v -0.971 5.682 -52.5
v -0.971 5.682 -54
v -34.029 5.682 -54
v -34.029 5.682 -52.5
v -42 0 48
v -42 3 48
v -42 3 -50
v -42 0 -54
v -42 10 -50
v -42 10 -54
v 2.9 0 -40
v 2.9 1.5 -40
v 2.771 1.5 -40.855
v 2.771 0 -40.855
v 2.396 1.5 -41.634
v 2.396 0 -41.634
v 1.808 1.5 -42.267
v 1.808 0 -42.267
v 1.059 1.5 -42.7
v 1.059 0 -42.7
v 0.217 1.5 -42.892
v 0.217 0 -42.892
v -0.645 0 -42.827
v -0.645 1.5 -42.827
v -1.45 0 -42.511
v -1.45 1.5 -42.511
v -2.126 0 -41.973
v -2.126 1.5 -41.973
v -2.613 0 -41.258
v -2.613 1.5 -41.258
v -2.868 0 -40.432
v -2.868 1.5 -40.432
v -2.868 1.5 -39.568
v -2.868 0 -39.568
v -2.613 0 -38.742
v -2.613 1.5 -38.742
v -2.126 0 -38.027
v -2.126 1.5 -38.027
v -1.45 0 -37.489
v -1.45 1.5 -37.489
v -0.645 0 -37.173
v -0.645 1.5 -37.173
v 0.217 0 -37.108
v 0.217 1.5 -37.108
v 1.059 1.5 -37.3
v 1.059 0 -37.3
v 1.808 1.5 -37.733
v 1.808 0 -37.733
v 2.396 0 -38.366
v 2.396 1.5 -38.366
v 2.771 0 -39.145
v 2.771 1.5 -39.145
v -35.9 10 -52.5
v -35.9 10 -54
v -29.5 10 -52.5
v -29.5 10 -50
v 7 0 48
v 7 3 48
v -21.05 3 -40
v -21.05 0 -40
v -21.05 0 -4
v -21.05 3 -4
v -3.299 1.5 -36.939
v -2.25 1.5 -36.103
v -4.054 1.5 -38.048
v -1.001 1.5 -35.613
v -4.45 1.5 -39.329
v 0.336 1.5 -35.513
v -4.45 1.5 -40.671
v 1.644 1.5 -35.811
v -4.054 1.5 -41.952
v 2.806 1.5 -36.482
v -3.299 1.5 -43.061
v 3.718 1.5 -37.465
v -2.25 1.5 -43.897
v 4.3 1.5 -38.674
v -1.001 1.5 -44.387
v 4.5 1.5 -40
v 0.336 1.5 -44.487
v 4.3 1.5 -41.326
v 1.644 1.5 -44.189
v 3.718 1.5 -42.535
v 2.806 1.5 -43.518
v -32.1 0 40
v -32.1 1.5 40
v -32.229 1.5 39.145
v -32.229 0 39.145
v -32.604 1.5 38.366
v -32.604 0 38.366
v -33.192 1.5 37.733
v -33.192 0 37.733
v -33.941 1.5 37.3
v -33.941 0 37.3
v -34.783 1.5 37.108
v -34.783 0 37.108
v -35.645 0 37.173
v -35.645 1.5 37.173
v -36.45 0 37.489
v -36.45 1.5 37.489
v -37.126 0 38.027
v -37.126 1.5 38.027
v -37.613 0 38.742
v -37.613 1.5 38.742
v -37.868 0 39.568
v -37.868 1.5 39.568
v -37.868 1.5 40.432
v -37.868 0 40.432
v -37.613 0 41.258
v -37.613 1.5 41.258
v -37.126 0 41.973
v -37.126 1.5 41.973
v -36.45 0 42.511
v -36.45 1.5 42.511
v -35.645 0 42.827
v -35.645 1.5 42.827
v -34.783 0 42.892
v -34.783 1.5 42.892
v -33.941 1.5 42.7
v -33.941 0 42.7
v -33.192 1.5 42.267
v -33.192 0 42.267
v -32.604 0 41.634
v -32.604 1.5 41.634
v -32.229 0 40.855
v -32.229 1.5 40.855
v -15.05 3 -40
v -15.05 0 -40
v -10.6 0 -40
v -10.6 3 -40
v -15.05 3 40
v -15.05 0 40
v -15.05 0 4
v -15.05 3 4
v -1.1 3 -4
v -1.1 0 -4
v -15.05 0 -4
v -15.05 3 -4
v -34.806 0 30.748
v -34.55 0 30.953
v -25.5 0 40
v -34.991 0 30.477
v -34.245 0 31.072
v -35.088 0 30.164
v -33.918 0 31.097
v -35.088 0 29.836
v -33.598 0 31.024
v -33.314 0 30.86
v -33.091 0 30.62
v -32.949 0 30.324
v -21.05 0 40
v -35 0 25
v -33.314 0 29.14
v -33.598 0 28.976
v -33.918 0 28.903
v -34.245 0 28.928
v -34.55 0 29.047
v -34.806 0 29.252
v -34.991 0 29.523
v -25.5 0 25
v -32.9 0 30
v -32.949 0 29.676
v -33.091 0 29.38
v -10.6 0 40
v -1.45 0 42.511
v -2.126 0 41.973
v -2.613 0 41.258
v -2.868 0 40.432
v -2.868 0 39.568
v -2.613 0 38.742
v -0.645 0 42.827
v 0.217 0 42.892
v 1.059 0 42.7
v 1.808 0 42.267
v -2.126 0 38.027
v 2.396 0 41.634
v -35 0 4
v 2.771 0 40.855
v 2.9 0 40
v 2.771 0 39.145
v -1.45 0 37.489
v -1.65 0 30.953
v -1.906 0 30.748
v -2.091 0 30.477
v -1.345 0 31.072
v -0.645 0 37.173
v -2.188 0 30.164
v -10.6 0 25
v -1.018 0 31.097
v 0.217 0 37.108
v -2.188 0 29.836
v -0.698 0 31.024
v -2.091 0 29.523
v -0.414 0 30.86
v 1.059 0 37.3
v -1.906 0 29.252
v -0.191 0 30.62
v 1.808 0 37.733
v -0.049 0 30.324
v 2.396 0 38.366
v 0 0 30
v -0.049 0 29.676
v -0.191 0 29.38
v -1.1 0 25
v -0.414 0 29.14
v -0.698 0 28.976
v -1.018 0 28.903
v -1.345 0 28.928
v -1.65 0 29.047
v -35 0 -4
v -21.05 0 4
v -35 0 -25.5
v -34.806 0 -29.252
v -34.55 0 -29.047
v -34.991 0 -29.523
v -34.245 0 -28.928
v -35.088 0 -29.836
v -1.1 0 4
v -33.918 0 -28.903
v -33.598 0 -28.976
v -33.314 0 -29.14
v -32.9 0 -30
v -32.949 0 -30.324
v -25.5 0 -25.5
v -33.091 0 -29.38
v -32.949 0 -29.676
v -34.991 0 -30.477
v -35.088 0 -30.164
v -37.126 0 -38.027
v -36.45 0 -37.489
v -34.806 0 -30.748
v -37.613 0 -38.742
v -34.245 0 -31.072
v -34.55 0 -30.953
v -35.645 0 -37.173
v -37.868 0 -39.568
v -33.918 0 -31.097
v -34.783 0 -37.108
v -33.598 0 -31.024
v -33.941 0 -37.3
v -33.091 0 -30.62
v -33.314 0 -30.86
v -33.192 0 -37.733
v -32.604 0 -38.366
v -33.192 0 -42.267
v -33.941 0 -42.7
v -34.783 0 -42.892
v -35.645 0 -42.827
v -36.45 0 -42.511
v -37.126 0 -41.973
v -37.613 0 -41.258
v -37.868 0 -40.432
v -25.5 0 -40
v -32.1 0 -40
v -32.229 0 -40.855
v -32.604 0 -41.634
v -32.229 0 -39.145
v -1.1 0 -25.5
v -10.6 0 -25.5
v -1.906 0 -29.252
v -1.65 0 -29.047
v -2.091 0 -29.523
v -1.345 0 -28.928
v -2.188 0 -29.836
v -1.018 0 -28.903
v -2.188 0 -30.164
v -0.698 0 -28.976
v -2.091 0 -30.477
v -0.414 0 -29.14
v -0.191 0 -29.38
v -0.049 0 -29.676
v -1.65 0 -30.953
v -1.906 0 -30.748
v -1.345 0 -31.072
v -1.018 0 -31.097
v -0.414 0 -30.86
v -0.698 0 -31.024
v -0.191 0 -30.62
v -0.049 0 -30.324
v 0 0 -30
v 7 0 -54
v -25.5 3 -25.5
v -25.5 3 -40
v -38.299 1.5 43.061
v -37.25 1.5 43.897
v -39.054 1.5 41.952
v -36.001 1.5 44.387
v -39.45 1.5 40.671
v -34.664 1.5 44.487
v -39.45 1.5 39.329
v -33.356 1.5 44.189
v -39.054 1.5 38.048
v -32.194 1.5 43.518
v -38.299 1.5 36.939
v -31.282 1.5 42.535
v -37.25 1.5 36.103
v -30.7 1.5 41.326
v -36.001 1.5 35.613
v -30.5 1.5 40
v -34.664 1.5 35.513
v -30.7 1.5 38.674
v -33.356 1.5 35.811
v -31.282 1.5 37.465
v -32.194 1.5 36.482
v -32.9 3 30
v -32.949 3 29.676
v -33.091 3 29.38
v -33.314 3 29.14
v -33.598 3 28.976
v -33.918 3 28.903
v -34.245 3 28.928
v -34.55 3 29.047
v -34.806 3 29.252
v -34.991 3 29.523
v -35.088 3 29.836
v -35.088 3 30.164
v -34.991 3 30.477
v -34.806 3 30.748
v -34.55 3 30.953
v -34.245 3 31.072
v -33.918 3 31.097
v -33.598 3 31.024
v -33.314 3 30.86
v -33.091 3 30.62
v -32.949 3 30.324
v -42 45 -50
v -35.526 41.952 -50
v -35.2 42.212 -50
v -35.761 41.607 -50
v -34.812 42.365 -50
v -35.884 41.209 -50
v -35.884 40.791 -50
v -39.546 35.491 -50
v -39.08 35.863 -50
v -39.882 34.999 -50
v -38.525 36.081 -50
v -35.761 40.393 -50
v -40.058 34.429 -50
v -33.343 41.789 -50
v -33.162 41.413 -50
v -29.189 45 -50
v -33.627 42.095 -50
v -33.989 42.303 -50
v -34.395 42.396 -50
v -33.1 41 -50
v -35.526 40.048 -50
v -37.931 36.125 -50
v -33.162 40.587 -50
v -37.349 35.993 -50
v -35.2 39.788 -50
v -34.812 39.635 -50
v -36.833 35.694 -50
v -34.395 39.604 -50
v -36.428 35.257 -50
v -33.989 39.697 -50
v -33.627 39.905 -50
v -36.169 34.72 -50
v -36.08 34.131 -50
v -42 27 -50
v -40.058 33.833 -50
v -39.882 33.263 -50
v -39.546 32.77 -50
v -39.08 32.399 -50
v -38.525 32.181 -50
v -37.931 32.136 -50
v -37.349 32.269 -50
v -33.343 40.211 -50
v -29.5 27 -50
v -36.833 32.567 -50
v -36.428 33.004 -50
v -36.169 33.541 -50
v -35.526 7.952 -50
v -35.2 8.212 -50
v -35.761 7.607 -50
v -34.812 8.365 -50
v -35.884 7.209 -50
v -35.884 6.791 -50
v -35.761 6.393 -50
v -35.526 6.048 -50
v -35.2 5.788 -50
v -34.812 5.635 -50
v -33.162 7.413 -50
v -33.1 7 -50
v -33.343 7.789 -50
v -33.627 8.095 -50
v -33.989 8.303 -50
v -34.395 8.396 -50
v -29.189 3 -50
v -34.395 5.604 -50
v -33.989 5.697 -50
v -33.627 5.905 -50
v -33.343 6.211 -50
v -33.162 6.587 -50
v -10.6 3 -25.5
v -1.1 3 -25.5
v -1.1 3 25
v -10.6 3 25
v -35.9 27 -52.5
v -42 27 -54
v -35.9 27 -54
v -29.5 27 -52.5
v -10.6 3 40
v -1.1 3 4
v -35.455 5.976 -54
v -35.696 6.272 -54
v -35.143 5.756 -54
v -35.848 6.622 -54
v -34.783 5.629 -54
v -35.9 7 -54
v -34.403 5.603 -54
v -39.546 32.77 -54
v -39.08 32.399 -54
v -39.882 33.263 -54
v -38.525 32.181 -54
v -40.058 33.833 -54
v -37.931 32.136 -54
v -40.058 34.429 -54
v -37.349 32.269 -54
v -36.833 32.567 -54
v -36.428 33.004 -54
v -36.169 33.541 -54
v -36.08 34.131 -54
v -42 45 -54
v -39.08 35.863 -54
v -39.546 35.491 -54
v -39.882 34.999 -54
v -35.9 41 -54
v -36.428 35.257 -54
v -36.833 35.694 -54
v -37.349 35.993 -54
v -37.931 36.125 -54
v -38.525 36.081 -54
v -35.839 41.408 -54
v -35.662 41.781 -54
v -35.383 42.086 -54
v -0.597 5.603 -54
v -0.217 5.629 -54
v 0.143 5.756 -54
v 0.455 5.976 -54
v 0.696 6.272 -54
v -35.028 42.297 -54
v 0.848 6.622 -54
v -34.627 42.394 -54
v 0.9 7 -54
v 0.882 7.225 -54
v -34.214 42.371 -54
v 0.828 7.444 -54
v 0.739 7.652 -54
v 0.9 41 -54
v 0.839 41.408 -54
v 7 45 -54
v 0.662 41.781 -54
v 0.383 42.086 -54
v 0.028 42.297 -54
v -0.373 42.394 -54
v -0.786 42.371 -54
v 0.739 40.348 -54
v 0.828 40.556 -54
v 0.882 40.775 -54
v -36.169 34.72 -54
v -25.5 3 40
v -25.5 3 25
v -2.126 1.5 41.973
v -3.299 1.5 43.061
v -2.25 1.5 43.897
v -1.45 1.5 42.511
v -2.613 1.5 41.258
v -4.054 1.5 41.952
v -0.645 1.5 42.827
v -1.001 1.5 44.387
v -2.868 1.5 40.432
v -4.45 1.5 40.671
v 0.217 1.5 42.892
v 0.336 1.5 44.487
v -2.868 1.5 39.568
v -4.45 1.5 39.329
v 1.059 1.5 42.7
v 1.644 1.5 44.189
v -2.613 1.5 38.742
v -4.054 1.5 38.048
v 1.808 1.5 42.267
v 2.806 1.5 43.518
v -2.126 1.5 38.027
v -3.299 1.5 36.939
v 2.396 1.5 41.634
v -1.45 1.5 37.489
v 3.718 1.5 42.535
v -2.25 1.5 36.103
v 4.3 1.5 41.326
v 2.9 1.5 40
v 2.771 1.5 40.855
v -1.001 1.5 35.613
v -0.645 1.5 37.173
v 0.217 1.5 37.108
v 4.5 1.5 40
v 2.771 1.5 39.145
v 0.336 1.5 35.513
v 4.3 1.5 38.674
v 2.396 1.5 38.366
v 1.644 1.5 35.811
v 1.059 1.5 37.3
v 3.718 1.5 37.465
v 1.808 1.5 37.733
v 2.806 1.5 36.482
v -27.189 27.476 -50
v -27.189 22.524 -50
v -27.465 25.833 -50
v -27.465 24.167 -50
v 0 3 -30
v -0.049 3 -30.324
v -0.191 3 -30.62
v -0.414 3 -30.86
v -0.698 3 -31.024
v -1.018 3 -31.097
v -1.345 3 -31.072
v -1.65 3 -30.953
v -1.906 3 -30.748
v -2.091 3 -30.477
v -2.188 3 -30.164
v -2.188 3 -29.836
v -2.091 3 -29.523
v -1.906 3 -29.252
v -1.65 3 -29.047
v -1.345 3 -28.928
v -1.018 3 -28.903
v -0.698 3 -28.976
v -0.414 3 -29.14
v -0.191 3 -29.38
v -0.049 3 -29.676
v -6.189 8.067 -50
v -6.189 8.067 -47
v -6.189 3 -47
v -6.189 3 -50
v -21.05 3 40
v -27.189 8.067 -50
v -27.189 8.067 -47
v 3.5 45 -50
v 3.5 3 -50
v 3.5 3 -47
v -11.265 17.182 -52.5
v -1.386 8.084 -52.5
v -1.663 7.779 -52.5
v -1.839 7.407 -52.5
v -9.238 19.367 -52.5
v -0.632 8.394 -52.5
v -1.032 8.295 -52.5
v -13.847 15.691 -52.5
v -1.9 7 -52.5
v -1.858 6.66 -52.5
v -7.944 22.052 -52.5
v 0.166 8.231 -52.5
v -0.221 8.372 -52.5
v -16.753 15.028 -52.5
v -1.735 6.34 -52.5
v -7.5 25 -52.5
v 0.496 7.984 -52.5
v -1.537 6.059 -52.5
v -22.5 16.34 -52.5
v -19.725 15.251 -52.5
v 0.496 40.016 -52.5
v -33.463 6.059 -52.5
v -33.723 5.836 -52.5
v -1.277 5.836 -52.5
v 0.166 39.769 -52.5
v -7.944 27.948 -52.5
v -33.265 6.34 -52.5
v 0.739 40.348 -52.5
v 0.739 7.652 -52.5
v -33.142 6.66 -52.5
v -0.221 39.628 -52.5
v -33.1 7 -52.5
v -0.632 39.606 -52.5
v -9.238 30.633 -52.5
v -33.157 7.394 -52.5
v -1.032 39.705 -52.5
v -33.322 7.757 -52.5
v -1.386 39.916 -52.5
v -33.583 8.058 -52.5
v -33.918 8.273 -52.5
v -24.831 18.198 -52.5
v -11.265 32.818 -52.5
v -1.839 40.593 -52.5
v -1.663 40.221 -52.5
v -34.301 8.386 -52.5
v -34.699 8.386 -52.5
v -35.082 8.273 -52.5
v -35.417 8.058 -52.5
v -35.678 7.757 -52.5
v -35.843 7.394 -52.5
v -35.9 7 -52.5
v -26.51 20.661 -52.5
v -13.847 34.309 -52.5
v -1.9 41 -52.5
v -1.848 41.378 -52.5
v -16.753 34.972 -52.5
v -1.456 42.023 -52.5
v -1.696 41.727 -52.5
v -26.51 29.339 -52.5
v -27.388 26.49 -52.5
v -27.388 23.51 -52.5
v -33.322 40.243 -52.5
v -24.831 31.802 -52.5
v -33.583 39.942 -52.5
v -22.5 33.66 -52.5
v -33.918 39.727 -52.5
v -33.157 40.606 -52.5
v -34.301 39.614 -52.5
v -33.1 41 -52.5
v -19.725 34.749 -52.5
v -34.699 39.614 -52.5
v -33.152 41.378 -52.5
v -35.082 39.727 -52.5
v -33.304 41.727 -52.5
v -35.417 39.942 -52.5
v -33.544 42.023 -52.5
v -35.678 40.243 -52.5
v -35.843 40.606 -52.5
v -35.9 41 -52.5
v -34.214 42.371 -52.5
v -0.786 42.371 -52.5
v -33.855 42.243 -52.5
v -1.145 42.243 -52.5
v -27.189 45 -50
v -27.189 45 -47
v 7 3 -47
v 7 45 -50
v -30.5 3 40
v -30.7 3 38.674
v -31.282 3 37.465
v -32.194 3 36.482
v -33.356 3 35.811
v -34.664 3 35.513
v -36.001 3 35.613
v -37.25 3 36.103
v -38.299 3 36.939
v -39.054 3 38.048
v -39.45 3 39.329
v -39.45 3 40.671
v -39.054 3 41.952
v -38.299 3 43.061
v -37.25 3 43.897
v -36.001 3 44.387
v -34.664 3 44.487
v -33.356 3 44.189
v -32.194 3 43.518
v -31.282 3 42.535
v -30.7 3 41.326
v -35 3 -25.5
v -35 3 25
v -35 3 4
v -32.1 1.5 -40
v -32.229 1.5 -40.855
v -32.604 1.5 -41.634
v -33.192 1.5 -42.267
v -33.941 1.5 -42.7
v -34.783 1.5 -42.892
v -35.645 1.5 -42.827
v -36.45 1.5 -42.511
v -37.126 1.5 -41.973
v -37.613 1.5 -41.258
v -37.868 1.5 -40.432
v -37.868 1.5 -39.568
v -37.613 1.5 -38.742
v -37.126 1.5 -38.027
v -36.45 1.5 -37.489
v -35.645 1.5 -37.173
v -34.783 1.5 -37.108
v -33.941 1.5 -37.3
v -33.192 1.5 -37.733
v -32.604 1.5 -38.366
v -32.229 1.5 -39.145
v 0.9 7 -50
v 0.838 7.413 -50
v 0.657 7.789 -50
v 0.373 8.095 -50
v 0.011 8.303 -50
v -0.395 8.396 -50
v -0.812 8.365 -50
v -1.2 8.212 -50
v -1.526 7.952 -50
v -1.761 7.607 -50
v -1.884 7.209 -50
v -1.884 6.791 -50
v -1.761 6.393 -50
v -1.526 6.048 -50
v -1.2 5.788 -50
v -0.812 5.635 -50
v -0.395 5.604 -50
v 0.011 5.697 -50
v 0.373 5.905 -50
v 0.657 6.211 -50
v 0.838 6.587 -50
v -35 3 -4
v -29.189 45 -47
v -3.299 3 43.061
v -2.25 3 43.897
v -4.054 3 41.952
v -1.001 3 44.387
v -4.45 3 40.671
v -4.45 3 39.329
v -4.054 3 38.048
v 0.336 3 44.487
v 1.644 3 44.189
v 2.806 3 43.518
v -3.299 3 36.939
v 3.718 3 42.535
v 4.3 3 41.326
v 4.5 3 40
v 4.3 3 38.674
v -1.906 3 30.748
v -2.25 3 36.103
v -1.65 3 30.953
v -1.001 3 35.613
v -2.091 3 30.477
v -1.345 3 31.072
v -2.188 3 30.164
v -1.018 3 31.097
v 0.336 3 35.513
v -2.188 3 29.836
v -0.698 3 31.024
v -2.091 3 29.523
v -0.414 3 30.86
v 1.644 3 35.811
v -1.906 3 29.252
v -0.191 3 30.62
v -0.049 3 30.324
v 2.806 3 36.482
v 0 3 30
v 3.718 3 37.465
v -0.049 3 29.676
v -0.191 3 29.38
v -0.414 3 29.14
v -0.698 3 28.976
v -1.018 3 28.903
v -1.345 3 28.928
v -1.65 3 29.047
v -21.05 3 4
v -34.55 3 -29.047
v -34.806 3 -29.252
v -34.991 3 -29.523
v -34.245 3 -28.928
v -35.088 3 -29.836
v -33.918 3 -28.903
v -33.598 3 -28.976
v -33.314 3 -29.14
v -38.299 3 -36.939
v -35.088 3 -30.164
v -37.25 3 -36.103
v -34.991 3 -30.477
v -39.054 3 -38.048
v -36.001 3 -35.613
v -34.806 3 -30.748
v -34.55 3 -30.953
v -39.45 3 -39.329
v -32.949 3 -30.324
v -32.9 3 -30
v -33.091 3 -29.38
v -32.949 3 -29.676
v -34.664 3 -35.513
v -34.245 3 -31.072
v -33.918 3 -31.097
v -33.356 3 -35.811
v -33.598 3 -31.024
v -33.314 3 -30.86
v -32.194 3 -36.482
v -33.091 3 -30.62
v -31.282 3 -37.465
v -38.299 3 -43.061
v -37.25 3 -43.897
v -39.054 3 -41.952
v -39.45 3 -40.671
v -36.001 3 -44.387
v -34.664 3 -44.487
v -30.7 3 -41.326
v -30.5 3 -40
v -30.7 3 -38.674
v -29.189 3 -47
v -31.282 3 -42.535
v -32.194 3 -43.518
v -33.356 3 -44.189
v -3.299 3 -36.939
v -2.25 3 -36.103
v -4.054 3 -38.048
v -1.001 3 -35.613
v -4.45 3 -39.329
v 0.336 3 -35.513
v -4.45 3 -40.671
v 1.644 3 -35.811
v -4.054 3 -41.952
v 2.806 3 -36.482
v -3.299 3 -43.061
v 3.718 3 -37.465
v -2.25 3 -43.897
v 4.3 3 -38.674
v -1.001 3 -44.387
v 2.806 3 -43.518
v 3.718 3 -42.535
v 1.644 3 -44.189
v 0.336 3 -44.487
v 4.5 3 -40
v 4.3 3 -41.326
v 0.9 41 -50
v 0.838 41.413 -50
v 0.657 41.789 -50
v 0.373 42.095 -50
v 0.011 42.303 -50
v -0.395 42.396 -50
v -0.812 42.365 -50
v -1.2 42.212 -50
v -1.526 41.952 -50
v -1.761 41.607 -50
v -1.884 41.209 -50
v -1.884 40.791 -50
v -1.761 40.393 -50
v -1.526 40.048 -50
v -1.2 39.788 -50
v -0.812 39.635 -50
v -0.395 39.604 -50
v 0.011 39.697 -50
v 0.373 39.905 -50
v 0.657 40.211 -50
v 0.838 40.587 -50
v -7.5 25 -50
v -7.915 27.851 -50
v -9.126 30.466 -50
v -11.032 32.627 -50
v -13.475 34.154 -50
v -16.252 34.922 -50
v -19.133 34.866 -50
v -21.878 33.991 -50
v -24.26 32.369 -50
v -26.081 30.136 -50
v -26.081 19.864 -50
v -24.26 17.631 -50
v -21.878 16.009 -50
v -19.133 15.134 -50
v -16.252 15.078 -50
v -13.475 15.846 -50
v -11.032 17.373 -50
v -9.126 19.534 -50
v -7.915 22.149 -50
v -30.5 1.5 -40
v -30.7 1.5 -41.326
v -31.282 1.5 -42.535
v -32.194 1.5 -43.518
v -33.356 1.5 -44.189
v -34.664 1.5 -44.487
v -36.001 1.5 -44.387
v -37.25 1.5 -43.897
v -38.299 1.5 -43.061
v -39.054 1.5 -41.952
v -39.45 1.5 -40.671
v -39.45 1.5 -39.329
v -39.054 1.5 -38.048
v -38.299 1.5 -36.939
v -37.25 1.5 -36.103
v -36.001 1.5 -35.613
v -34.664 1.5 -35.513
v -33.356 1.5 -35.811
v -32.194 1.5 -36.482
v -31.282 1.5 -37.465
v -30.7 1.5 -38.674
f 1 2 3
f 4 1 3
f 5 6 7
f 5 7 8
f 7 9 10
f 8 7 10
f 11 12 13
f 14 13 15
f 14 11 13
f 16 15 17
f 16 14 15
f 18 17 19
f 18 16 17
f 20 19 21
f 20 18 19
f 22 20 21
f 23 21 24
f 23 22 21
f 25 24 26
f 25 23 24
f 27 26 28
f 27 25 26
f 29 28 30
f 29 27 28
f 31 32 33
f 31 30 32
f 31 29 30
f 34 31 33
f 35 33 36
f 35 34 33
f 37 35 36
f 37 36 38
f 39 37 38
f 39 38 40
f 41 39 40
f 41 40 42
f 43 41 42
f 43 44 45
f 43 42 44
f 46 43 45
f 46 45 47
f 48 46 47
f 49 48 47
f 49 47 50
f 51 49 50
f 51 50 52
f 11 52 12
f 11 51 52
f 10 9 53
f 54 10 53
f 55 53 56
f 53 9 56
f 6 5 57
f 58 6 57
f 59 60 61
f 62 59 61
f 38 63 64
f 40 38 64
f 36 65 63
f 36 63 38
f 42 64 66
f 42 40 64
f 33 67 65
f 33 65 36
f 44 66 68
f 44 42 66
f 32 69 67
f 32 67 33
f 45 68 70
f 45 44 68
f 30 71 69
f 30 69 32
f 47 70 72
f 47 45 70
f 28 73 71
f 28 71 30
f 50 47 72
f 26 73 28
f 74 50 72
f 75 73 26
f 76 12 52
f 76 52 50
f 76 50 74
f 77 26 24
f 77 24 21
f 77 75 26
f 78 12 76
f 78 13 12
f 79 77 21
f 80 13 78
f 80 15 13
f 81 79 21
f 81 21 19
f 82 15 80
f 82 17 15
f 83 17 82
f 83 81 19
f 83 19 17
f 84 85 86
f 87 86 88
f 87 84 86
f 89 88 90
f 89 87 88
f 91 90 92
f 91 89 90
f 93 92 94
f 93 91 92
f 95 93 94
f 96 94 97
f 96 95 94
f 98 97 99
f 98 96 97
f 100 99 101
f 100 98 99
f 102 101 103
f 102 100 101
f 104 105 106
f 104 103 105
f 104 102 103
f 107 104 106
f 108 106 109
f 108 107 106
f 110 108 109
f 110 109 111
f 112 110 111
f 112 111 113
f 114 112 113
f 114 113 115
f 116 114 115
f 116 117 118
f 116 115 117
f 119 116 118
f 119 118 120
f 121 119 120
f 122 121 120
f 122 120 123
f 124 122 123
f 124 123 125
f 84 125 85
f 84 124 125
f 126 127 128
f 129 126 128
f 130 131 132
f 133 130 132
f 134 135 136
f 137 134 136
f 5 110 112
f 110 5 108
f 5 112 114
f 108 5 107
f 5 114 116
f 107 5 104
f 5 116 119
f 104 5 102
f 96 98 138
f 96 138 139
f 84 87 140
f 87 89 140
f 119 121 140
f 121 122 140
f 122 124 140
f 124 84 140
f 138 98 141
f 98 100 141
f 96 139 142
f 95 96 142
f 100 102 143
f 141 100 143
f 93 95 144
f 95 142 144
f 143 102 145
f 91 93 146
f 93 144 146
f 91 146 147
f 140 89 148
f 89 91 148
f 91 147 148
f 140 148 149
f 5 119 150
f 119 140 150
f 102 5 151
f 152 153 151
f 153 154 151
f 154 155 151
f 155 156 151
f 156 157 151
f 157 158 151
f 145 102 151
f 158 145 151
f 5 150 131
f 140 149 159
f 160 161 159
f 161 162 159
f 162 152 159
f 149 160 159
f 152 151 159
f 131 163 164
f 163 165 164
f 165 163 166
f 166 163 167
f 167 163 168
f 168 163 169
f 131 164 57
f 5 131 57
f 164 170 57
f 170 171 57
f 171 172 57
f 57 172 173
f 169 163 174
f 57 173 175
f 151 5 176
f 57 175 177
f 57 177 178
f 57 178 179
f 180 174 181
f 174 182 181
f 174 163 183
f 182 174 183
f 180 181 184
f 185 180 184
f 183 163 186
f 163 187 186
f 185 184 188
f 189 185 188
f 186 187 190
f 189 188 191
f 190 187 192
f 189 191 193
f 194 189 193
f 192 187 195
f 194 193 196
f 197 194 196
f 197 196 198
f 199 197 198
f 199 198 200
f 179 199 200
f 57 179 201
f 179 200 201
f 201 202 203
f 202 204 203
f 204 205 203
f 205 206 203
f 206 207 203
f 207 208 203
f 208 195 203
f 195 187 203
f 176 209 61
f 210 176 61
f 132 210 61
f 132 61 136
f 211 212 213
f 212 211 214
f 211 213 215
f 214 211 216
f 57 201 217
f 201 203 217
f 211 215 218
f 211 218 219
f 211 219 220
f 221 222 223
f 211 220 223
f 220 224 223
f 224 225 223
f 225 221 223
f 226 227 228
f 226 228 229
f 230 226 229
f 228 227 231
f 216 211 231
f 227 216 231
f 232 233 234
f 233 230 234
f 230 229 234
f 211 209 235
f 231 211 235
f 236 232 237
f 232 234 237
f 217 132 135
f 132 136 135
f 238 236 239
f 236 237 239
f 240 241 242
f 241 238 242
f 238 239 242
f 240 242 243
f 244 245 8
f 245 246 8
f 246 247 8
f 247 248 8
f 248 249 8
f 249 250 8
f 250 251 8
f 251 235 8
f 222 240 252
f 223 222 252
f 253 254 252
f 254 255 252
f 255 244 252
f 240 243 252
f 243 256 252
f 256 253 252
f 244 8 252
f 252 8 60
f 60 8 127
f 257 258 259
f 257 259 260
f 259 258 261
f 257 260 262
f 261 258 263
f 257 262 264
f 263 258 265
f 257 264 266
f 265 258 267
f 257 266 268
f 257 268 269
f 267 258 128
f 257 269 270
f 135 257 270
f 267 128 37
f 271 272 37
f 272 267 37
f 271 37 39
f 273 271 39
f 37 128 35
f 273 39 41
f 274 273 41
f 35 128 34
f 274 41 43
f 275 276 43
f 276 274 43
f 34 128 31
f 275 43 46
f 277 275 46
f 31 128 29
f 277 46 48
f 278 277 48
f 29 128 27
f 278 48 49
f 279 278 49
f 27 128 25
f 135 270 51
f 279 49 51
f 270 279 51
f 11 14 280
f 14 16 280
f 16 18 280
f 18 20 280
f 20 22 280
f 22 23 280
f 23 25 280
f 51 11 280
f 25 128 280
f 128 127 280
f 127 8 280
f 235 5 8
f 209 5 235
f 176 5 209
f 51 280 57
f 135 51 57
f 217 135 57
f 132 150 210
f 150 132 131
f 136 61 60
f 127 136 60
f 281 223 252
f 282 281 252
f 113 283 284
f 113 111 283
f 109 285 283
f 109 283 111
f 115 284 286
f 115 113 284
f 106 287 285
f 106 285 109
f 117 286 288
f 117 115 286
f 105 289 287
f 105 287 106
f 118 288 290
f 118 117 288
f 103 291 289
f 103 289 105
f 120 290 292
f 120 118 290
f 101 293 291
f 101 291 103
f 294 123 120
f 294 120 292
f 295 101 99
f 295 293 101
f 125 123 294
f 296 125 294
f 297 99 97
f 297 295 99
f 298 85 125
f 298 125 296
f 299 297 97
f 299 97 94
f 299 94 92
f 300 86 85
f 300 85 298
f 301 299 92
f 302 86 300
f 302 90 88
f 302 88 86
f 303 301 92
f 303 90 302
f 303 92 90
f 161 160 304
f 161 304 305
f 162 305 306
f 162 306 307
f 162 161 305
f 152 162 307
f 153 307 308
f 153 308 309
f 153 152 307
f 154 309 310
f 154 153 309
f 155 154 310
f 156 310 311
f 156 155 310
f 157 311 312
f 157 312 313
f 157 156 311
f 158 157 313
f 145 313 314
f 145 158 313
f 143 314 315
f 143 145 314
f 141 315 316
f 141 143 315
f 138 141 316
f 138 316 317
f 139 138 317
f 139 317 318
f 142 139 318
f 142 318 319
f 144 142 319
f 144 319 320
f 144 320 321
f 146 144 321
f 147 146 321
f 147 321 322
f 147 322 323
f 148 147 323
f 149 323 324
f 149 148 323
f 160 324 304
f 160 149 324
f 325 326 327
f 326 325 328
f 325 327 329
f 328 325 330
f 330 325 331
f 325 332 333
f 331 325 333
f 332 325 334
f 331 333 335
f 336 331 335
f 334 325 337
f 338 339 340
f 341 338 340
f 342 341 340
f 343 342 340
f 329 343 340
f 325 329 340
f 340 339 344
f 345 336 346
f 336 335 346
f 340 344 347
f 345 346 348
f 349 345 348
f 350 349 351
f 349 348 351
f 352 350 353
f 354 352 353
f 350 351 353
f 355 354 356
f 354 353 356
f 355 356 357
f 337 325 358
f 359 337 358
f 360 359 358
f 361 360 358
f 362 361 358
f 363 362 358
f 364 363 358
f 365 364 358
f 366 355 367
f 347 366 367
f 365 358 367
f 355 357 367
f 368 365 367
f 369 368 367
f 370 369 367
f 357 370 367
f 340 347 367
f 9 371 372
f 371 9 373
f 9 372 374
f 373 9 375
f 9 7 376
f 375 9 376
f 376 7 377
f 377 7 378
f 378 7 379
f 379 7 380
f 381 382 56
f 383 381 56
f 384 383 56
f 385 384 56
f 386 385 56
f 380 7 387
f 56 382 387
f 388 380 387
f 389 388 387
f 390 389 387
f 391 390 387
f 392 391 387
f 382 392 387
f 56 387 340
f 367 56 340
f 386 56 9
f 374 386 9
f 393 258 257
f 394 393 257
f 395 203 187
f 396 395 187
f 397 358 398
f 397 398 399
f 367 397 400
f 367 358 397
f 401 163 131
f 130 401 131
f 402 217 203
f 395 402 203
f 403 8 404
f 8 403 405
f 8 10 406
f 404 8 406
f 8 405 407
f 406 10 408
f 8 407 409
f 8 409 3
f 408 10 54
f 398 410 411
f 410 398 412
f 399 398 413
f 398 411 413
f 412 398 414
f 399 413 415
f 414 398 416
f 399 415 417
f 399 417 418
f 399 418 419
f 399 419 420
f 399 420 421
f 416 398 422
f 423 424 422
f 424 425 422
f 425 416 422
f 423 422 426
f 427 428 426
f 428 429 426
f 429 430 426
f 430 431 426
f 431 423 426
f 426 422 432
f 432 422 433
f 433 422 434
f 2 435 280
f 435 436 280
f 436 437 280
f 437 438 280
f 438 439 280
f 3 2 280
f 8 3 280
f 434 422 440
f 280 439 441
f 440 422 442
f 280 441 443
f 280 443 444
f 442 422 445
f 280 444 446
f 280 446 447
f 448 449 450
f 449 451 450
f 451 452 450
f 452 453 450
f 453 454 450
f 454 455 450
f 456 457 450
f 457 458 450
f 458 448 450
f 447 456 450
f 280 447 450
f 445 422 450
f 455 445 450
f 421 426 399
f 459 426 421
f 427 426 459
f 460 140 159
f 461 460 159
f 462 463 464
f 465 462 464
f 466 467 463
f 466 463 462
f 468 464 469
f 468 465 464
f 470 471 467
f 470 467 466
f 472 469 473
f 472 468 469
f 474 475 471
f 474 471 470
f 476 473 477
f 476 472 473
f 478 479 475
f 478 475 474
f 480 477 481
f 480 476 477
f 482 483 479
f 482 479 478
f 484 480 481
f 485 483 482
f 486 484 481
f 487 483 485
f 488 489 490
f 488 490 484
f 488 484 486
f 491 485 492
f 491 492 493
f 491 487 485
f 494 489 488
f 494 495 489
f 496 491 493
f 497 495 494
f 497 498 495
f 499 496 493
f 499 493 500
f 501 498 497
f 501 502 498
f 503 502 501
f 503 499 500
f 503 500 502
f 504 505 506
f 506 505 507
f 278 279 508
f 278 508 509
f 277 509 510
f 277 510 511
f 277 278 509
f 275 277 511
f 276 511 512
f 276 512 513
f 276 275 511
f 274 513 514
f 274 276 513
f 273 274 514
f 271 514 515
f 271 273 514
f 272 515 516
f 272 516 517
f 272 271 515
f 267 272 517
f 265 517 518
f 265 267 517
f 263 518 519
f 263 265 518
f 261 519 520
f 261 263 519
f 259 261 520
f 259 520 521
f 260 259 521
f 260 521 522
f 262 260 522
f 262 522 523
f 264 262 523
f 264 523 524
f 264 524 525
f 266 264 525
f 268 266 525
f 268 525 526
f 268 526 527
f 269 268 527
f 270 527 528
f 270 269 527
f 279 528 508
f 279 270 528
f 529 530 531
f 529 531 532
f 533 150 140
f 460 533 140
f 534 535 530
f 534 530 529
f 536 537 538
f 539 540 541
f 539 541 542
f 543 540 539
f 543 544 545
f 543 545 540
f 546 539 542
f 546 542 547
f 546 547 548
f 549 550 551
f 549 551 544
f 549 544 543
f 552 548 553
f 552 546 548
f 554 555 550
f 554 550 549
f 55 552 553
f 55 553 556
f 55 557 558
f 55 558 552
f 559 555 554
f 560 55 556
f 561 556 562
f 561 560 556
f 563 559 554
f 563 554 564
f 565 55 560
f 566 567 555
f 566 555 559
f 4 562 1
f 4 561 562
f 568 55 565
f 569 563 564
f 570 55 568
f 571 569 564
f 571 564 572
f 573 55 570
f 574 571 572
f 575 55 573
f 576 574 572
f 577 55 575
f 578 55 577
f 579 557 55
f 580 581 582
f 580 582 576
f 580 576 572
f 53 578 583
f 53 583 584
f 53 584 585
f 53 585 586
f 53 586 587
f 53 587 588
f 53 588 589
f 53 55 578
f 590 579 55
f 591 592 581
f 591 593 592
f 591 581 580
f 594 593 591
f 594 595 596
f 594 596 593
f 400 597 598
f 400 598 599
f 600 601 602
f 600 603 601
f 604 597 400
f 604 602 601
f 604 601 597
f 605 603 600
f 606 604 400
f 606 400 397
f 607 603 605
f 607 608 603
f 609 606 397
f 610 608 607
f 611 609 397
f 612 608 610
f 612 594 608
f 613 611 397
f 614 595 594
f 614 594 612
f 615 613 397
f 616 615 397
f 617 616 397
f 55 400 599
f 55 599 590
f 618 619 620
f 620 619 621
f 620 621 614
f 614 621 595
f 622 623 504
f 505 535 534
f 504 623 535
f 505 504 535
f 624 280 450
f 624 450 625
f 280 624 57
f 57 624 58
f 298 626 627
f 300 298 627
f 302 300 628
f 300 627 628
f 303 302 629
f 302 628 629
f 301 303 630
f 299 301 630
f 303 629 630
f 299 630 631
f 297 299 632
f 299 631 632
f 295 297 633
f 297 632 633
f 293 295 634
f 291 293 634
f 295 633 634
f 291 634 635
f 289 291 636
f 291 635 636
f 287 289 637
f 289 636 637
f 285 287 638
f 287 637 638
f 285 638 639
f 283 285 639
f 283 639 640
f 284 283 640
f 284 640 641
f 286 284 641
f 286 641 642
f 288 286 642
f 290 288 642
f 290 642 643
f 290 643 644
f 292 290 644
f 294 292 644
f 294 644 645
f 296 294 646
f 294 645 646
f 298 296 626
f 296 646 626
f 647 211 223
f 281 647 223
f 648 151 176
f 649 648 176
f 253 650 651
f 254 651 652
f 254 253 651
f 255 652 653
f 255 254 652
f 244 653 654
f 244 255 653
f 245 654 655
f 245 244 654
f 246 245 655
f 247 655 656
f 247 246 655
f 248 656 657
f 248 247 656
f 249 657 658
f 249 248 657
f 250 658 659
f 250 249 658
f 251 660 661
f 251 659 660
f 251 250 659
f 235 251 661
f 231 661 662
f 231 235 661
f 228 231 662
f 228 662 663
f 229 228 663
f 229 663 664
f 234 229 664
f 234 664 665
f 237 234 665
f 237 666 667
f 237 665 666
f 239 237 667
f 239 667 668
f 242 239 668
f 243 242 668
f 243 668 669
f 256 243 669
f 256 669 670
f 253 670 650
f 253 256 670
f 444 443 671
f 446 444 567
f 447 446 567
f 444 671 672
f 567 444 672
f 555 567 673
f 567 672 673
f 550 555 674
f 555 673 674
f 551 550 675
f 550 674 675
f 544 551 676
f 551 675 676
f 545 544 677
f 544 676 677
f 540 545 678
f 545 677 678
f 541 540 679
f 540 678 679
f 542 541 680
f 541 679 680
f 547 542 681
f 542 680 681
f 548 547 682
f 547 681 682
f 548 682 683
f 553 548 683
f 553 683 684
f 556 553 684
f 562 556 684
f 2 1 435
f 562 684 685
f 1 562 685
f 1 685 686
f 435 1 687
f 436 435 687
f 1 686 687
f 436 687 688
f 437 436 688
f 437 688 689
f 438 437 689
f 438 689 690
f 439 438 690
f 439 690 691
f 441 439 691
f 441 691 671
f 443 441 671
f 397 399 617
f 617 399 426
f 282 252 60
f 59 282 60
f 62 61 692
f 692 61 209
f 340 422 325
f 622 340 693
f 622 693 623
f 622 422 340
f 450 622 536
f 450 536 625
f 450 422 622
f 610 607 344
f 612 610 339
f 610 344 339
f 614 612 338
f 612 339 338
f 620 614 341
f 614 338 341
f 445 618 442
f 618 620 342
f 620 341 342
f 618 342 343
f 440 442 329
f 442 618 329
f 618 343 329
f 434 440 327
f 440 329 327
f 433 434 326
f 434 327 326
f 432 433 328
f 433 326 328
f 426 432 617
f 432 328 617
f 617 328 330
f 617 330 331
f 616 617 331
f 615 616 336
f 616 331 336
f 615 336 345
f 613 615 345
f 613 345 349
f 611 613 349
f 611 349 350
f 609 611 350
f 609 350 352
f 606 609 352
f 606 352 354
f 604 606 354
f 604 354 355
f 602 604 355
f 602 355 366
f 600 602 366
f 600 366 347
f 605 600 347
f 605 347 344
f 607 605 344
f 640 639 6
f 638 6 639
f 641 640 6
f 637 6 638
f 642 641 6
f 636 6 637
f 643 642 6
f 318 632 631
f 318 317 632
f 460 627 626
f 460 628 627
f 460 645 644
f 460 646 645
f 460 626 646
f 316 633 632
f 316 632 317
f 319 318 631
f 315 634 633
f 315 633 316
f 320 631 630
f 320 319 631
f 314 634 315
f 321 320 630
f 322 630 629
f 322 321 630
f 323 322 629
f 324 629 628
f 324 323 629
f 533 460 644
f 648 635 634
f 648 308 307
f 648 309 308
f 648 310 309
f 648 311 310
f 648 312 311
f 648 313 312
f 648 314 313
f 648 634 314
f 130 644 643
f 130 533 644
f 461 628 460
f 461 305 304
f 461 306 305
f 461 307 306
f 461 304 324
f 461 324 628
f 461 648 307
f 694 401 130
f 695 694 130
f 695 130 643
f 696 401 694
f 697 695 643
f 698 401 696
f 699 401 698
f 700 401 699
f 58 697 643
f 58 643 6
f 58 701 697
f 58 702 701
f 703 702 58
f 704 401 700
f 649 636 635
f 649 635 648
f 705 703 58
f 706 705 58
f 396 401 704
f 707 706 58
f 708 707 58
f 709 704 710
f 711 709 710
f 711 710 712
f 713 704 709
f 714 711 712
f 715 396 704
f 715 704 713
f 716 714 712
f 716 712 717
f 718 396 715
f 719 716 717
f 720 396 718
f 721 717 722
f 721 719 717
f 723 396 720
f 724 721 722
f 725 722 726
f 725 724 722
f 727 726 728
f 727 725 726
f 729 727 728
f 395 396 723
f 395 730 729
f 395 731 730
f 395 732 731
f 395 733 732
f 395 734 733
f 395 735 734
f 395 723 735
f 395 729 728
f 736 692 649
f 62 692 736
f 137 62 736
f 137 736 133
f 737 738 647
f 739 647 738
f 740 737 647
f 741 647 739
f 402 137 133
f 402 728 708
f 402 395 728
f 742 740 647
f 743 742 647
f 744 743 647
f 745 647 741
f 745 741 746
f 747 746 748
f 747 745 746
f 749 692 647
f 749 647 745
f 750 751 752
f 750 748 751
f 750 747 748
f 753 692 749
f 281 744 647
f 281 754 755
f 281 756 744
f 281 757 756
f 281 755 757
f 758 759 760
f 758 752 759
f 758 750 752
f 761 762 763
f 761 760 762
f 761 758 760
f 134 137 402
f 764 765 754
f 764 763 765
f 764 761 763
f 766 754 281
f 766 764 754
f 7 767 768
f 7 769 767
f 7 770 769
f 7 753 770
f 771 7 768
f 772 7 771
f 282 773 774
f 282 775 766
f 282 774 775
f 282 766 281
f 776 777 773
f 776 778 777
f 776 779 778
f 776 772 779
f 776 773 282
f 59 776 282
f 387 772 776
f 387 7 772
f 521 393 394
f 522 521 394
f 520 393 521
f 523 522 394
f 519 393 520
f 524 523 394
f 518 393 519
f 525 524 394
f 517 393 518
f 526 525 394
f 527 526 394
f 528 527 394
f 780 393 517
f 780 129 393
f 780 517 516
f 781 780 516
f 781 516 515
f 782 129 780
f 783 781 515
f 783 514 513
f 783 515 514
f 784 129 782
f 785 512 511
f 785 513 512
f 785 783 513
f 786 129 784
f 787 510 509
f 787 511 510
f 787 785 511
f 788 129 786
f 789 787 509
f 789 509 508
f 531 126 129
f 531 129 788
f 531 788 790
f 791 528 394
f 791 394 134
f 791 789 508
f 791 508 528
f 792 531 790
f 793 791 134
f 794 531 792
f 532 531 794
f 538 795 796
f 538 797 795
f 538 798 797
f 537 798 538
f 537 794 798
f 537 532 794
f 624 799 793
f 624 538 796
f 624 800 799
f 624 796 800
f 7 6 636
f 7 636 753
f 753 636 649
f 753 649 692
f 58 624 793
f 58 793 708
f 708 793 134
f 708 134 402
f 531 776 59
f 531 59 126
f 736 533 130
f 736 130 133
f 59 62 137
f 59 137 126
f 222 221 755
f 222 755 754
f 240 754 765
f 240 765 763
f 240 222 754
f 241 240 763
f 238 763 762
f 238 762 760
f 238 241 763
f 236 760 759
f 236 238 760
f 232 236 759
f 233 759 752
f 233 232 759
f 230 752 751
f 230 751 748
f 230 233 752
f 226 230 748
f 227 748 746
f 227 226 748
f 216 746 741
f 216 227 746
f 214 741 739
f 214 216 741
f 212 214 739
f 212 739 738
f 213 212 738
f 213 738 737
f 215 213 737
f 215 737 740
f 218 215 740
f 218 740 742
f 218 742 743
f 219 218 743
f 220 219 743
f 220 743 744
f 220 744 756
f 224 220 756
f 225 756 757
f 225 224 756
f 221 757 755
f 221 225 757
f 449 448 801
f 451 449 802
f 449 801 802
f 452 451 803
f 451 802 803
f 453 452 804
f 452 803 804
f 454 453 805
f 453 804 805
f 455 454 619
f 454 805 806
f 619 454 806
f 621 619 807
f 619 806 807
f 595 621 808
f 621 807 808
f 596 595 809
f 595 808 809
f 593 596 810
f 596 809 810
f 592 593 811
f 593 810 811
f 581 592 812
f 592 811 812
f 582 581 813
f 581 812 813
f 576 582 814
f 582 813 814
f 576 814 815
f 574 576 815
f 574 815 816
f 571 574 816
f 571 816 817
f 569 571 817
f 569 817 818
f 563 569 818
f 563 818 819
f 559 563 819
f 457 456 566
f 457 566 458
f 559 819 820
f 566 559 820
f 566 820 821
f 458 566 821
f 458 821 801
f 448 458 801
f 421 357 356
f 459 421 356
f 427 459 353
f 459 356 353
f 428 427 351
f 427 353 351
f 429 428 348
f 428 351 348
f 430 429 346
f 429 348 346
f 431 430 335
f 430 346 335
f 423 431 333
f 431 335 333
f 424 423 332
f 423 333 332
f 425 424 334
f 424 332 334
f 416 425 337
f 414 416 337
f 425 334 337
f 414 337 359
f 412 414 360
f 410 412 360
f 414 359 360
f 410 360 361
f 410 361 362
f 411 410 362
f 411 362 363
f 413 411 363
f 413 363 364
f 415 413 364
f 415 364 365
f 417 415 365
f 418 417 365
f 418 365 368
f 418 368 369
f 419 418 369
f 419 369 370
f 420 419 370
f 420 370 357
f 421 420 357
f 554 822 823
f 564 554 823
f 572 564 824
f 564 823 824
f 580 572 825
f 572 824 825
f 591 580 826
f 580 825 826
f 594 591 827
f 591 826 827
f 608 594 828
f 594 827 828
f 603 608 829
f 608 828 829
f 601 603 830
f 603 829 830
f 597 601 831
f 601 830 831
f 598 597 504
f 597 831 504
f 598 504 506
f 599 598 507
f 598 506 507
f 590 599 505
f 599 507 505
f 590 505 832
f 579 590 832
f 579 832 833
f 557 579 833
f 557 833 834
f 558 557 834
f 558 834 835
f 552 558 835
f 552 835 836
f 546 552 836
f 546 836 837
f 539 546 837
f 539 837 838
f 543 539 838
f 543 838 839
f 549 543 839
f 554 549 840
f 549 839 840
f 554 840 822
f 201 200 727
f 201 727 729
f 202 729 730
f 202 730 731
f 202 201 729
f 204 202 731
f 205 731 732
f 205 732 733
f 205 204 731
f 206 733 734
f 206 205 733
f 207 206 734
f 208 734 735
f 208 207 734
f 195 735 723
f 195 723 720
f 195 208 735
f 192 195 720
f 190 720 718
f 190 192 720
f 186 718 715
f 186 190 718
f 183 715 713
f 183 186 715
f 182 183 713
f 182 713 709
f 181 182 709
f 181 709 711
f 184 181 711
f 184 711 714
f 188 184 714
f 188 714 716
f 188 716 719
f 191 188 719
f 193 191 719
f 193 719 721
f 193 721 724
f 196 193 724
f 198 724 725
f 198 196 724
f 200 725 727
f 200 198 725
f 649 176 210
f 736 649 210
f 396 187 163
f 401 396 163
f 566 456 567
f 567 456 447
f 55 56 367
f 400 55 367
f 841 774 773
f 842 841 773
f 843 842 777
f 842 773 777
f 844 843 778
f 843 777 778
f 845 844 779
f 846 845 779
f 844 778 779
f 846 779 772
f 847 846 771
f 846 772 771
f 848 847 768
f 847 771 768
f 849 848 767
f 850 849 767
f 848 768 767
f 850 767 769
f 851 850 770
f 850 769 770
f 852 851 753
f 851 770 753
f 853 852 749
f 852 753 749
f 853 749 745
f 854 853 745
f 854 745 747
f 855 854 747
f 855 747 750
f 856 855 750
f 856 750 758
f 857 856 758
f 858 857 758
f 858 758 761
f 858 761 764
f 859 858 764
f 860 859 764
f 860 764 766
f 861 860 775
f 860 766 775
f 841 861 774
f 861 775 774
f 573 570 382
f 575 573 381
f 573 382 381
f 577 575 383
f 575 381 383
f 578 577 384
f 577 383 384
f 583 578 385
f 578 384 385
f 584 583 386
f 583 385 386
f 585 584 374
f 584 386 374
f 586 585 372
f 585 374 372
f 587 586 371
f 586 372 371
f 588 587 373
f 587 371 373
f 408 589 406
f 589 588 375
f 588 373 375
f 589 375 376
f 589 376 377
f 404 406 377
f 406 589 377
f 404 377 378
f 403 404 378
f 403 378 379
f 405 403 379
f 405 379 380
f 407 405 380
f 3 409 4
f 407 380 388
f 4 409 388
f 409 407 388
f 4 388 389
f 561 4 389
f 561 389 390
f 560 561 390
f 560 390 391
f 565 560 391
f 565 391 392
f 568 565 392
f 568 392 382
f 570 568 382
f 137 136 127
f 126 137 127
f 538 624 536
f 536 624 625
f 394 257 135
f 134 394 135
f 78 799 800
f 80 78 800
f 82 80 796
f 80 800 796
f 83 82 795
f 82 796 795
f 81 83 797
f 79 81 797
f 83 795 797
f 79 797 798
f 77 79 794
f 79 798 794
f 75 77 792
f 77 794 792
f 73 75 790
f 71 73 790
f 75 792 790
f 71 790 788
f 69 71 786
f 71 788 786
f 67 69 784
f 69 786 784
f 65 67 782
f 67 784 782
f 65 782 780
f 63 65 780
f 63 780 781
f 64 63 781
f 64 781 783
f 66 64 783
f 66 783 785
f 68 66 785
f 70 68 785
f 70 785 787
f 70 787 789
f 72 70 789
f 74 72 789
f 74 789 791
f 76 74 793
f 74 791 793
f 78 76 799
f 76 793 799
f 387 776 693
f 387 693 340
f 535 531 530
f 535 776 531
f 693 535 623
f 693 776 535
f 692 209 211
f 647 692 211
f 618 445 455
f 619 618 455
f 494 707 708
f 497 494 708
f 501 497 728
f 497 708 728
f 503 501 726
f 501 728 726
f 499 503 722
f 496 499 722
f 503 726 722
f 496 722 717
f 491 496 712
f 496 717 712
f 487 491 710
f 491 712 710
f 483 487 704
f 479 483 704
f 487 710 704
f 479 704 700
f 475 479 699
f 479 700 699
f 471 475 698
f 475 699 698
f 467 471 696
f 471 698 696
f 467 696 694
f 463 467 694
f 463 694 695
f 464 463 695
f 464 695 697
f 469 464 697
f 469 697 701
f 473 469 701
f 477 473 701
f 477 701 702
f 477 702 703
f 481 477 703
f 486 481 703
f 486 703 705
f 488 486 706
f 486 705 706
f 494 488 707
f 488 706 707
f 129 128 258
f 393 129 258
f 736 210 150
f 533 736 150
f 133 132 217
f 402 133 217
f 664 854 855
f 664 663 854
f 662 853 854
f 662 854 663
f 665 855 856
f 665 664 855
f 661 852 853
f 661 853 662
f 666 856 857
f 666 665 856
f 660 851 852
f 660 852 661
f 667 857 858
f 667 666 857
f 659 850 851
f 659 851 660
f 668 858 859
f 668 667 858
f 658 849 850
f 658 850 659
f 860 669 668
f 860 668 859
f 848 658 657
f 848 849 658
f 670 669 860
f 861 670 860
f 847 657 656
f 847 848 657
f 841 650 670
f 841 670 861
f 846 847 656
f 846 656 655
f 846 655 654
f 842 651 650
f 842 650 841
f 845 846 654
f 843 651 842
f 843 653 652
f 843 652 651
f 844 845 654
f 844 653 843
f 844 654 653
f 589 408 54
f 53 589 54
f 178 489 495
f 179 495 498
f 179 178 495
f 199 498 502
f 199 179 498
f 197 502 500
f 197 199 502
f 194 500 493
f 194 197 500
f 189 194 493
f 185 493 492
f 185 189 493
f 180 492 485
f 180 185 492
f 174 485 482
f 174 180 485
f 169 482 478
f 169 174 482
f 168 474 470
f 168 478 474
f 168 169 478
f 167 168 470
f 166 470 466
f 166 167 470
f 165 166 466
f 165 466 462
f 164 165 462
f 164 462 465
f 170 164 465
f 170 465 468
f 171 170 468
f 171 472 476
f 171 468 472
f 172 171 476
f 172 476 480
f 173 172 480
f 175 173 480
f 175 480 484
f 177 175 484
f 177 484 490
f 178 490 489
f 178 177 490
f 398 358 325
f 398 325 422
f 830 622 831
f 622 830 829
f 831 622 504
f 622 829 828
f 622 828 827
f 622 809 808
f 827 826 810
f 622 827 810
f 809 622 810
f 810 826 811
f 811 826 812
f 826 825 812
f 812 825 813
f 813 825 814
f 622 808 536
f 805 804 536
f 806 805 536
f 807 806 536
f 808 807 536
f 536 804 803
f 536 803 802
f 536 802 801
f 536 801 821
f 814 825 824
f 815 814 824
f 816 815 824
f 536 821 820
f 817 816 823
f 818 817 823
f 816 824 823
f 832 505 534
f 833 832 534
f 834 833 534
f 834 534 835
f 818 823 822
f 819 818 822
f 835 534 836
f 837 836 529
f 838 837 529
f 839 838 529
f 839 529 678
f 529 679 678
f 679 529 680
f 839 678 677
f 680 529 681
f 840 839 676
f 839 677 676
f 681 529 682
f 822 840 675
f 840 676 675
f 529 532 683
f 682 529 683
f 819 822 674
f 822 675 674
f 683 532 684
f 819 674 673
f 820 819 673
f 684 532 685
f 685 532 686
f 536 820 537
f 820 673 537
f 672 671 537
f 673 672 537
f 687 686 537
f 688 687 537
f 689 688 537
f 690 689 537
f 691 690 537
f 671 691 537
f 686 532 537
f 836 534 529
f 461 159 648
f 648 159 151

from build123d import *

# Parameters (mm, degrees)
SKETCH_1_R           = 2.9
SKETCH_1_R_2         = 1.1
EXTRUDE_1_DEPTH      = 3
SKETCH_2_R           = 4.5
CUT_EXTRUDE_1_DEPTH  = 1.5
SKETCH_3_W           = 49
SKETCH_3_H           = 4
EXTRUDE_2_DEPTH      = 42
EXTRUDE_2_DEPTH_BACK = 3
SKETCH_4_R           = 1.4
SKETCH_4_W           = 14.760499622
SKETCH_4_H           = 17
SKETCH_4_R_2         = 10
SKETCH_4_R_3         = 2
CUT_EXTRUDE_2_DEPTH  = 5
SKETCH_5_R           = 10
CUT_EXTRUDE_3_DEPTH  = 1.5
EXTRUDE_4_DEPTH      = 3.5
SKETCH_9_W           = 2
SKETCH_9_H           = 3
EXTRUDE_5_DEPTH      = 42
SKETCH_10_W          = 3
SKETCH_10_H          = 5.066593596
EXTRUDE_6_DEPTH      = 21


with BuildPart() as part:
    # 草图1 → 凸台-拉伸1 (new body)
    with BuildSketch(Plane(origin=(0, 0, 0), x_dir=(1, 0, 0), z_dir=(0, 1, 0))):
        Polygon((-42, 46), (-42, -1), (-42, -48), (0, -48), (7, -48), (7, 47), (7, 50), (-42, 50), align=None)
        with Locations((-35, -40)):
            Circle(SKETCH_1_R, mode=Mode.SUBTRACT)
        with Locations((-34, -30)):
            Circle(SKETCH_1_R_2, mode=Mode.SUBTRACT)
        Polygon((-35, -25), (-35, -4), (-21.05, -4), (-21.05, -40), (-25.5, -40), (-25.5, -25), align=None, mode=Mode.SUBTRACT)
        with Locations((0, -40)):
            Circle(SKETCH_1_R, mode=Mode.SUBTRACT)
        with Locations((-1.1, -30)):
            Circle(SKETCH_1_R_2, mode=Mode.SUBTRACT)
        Polygon((-1.1, -4), (-1.1, -25), (-10.6, -25), (-10.6, -40), (-15.05, -40), (-15.05, -4), align=None, mode=Mode.SUBTRACT)
        Polygon((-21.05, 4), (-35, 4), (-35, 25.5), (-25.5, 25.5), (-25.5, 40), (-21.05, 40), align=None, mode=Mode.SUBTRACT)
        with Locations((-34, 30)):
            Circle(SKETCH_1_R_2, mode=Mode.SUBTRACT)
        with Locations((-35, 40)):
            Circle(SKETCH_1_R, mode=Mode.SUBTRACT)
        Polygon((-10.6, 25.5), (-1.1, 25.5), (-1.1, 4), (-15.05, 4), (-15.05, 40), (-10.6, 40), align=None, mode=Mode.SUBTRACT)
        with Locations((-1.1, 30)):
            Circle(SKETCH_1_R_2, mode=Mode.SUBTRACT)
        with Locations((0, 40)):
            Circle(SKETCH_1_R, mode=Mode.SUBTRACT)
    extrude(amount=EXTRUDE_1_DEPTH)

    # 草图2 → 切除-拉伸1 (cut)
    with BuildSketch(Plane(origin=(0, 3, 0), x_dir=(1, 0, 0), z_dir=(0, 1, 0))):
        with Locations((-35, 40)):
            Circle(SKETCH_2_R)
        with Locations((0, 40)):
            Circle(SKETCH_2_R)
        with Locations((0, -40)):
            Circle(SKETCH_2_R)
        with Locations((-35, -40)):
            Circle(SKETCH_2_R)
    extrude(amount=-CUT_EXTRUDE_1_DEPTH, mode=Mode.SUBTRACT)

    # 草图3 → 凸台-拉伸2 (add, two sides)
    with BuildSketch(Plane(origin=(0, 3, 0), x_dir=(1, 0, 0), z_dir=(0, 1, 0))) as extrude_2_sk:
        with Locations((-17.5, 52)):
            Rectangle(SKETCH_3_W, SKETCH_3_H)
    extrude(amount=EXTRUDE_2_DEPTH)
    extrude(extrude_2_sk.sketch, amount=-EXTRUDE_2_DEPTH_BACK)

    # 草图4 → 切除-拉伸2 (cut, through all)
    with BuildSketch(Plane.XY.offset(-50)):
        with Locations((-34.5, 7)):
            Circle(SKETCH_4_R)
        with Locations((-36.880249811, 18.5)):
            Rectangle(SKETCH_4_W, SKETCH_4_H)
        with Locations((-34.5, 41)):
            Circle(SKETCH_4_R)
        with Locations((-0.5, 41)):
            Circle(SKETCH_4_R)
        with Locations((-0.5, 7)):
            Circle(SKETCH_4_R)
        with Locations((-17.5, 25)):
            Circle(SKETCH_4_R_2)
        with Locations((-38.080040601, 34.130797069)):
            Circle(SKETCH_4_R_3)
    extrude(amount=-CUT_EXTRUDE_2_DEPTH, mode=Mode.SUBTRACT)

    # 草图5 → 切除-拉伸3 (cut)
    with BuildSketch(Plane(origin=(0, 0, -54), x_dir=(-1, 0, 0), z_dir=(0, 0, -1))):
        with BuildLine():
            ThreePointArc((1.9, 41), (0.835827548, 39.640875334), (-0.738885511, 40.347954994))
            Line((-0.738885511, 40.347954994), (-0.738885511, 7.652045006))
            ThreePointArc((-0.738885511, 7.652045006), (0.835827548, 8.359124666), (1.9, 7))
            ThreePointArc((1.9, 7), (1.644381785, 6.193532189), (0.970870956, 5.681561324))
            Line((0.970870956, 5.681561324), (34.029129044, 5.681561324))
            ThreePointArc((34.029129044, 5.681561324), (33.693532189, 8.144381785), (35.9, 7))
            Line((35.9, 7), (35.9, 10))
            Line((35.9, 10), (29.5, 10))
            Line((29.5, 10), (29.5, 27))
            Line((29.5, 27), (35.9, 27))
            Line((35.9, 27), (35.9, 41))
            ThreePointArc((35.9, 41), (33.616753245, 39.913779411), (34.214464044, 42.370572588))
            Line((34.214464044, 42.370572588), (0.785535956, 42.370572588))
            ThreePointArc((0.785535956, 42.370572588), (1.586220589, 41.883246755), (1.9, 41))
        make_face()
        with Locations((17.5, 25)):
            Circle(SKETCH_5_R, mode=Mode.SUBTRACT)
    extrude(amount=-CUT_EXTRUDE_3_DEPTH, mode=Mode.SUBTRACT)

    # 草图7 → 凸台-拉伸4 (add)
    with BuildSketch(Plane(origin=(7, 0, 0), x_dir=(0, 0, -1), z_dir=(1, 0, 0))):
        Polygon((50, 3), (47, 3), (50, 45), align=None)
    extrude(amount=-EXTRUDE_4_DEPTH)

    # 草图9 → 凸台-拉伸5 (add)
    with BuildSketch(Plane(origin=(0, 3, 0), x_dir=(1, 0, 0), z_dir=(0, 1, 0))):
        with Locations((-28.188676473, 48.5)):
            Rectangle(SKETCH_9_W, SKETCH_9_H)
    extrude(amount=EXTRUDE_5_DEPTH)

    # 草图10 → 凸台-拉伸6 (add)
    with BuildSketch(Plane(origin=(-27.188676473, 0, 0), x_dir=(0, 0, -1), z_dir=(1, 0, 0))):
        with Locations((48.5, 5.533296798)):
            Rectangle(SKETCH_10_W, SKETCH_10_H)
    extrude(amount=EXTRUDE_6_DEPTH)


solid = part.part
